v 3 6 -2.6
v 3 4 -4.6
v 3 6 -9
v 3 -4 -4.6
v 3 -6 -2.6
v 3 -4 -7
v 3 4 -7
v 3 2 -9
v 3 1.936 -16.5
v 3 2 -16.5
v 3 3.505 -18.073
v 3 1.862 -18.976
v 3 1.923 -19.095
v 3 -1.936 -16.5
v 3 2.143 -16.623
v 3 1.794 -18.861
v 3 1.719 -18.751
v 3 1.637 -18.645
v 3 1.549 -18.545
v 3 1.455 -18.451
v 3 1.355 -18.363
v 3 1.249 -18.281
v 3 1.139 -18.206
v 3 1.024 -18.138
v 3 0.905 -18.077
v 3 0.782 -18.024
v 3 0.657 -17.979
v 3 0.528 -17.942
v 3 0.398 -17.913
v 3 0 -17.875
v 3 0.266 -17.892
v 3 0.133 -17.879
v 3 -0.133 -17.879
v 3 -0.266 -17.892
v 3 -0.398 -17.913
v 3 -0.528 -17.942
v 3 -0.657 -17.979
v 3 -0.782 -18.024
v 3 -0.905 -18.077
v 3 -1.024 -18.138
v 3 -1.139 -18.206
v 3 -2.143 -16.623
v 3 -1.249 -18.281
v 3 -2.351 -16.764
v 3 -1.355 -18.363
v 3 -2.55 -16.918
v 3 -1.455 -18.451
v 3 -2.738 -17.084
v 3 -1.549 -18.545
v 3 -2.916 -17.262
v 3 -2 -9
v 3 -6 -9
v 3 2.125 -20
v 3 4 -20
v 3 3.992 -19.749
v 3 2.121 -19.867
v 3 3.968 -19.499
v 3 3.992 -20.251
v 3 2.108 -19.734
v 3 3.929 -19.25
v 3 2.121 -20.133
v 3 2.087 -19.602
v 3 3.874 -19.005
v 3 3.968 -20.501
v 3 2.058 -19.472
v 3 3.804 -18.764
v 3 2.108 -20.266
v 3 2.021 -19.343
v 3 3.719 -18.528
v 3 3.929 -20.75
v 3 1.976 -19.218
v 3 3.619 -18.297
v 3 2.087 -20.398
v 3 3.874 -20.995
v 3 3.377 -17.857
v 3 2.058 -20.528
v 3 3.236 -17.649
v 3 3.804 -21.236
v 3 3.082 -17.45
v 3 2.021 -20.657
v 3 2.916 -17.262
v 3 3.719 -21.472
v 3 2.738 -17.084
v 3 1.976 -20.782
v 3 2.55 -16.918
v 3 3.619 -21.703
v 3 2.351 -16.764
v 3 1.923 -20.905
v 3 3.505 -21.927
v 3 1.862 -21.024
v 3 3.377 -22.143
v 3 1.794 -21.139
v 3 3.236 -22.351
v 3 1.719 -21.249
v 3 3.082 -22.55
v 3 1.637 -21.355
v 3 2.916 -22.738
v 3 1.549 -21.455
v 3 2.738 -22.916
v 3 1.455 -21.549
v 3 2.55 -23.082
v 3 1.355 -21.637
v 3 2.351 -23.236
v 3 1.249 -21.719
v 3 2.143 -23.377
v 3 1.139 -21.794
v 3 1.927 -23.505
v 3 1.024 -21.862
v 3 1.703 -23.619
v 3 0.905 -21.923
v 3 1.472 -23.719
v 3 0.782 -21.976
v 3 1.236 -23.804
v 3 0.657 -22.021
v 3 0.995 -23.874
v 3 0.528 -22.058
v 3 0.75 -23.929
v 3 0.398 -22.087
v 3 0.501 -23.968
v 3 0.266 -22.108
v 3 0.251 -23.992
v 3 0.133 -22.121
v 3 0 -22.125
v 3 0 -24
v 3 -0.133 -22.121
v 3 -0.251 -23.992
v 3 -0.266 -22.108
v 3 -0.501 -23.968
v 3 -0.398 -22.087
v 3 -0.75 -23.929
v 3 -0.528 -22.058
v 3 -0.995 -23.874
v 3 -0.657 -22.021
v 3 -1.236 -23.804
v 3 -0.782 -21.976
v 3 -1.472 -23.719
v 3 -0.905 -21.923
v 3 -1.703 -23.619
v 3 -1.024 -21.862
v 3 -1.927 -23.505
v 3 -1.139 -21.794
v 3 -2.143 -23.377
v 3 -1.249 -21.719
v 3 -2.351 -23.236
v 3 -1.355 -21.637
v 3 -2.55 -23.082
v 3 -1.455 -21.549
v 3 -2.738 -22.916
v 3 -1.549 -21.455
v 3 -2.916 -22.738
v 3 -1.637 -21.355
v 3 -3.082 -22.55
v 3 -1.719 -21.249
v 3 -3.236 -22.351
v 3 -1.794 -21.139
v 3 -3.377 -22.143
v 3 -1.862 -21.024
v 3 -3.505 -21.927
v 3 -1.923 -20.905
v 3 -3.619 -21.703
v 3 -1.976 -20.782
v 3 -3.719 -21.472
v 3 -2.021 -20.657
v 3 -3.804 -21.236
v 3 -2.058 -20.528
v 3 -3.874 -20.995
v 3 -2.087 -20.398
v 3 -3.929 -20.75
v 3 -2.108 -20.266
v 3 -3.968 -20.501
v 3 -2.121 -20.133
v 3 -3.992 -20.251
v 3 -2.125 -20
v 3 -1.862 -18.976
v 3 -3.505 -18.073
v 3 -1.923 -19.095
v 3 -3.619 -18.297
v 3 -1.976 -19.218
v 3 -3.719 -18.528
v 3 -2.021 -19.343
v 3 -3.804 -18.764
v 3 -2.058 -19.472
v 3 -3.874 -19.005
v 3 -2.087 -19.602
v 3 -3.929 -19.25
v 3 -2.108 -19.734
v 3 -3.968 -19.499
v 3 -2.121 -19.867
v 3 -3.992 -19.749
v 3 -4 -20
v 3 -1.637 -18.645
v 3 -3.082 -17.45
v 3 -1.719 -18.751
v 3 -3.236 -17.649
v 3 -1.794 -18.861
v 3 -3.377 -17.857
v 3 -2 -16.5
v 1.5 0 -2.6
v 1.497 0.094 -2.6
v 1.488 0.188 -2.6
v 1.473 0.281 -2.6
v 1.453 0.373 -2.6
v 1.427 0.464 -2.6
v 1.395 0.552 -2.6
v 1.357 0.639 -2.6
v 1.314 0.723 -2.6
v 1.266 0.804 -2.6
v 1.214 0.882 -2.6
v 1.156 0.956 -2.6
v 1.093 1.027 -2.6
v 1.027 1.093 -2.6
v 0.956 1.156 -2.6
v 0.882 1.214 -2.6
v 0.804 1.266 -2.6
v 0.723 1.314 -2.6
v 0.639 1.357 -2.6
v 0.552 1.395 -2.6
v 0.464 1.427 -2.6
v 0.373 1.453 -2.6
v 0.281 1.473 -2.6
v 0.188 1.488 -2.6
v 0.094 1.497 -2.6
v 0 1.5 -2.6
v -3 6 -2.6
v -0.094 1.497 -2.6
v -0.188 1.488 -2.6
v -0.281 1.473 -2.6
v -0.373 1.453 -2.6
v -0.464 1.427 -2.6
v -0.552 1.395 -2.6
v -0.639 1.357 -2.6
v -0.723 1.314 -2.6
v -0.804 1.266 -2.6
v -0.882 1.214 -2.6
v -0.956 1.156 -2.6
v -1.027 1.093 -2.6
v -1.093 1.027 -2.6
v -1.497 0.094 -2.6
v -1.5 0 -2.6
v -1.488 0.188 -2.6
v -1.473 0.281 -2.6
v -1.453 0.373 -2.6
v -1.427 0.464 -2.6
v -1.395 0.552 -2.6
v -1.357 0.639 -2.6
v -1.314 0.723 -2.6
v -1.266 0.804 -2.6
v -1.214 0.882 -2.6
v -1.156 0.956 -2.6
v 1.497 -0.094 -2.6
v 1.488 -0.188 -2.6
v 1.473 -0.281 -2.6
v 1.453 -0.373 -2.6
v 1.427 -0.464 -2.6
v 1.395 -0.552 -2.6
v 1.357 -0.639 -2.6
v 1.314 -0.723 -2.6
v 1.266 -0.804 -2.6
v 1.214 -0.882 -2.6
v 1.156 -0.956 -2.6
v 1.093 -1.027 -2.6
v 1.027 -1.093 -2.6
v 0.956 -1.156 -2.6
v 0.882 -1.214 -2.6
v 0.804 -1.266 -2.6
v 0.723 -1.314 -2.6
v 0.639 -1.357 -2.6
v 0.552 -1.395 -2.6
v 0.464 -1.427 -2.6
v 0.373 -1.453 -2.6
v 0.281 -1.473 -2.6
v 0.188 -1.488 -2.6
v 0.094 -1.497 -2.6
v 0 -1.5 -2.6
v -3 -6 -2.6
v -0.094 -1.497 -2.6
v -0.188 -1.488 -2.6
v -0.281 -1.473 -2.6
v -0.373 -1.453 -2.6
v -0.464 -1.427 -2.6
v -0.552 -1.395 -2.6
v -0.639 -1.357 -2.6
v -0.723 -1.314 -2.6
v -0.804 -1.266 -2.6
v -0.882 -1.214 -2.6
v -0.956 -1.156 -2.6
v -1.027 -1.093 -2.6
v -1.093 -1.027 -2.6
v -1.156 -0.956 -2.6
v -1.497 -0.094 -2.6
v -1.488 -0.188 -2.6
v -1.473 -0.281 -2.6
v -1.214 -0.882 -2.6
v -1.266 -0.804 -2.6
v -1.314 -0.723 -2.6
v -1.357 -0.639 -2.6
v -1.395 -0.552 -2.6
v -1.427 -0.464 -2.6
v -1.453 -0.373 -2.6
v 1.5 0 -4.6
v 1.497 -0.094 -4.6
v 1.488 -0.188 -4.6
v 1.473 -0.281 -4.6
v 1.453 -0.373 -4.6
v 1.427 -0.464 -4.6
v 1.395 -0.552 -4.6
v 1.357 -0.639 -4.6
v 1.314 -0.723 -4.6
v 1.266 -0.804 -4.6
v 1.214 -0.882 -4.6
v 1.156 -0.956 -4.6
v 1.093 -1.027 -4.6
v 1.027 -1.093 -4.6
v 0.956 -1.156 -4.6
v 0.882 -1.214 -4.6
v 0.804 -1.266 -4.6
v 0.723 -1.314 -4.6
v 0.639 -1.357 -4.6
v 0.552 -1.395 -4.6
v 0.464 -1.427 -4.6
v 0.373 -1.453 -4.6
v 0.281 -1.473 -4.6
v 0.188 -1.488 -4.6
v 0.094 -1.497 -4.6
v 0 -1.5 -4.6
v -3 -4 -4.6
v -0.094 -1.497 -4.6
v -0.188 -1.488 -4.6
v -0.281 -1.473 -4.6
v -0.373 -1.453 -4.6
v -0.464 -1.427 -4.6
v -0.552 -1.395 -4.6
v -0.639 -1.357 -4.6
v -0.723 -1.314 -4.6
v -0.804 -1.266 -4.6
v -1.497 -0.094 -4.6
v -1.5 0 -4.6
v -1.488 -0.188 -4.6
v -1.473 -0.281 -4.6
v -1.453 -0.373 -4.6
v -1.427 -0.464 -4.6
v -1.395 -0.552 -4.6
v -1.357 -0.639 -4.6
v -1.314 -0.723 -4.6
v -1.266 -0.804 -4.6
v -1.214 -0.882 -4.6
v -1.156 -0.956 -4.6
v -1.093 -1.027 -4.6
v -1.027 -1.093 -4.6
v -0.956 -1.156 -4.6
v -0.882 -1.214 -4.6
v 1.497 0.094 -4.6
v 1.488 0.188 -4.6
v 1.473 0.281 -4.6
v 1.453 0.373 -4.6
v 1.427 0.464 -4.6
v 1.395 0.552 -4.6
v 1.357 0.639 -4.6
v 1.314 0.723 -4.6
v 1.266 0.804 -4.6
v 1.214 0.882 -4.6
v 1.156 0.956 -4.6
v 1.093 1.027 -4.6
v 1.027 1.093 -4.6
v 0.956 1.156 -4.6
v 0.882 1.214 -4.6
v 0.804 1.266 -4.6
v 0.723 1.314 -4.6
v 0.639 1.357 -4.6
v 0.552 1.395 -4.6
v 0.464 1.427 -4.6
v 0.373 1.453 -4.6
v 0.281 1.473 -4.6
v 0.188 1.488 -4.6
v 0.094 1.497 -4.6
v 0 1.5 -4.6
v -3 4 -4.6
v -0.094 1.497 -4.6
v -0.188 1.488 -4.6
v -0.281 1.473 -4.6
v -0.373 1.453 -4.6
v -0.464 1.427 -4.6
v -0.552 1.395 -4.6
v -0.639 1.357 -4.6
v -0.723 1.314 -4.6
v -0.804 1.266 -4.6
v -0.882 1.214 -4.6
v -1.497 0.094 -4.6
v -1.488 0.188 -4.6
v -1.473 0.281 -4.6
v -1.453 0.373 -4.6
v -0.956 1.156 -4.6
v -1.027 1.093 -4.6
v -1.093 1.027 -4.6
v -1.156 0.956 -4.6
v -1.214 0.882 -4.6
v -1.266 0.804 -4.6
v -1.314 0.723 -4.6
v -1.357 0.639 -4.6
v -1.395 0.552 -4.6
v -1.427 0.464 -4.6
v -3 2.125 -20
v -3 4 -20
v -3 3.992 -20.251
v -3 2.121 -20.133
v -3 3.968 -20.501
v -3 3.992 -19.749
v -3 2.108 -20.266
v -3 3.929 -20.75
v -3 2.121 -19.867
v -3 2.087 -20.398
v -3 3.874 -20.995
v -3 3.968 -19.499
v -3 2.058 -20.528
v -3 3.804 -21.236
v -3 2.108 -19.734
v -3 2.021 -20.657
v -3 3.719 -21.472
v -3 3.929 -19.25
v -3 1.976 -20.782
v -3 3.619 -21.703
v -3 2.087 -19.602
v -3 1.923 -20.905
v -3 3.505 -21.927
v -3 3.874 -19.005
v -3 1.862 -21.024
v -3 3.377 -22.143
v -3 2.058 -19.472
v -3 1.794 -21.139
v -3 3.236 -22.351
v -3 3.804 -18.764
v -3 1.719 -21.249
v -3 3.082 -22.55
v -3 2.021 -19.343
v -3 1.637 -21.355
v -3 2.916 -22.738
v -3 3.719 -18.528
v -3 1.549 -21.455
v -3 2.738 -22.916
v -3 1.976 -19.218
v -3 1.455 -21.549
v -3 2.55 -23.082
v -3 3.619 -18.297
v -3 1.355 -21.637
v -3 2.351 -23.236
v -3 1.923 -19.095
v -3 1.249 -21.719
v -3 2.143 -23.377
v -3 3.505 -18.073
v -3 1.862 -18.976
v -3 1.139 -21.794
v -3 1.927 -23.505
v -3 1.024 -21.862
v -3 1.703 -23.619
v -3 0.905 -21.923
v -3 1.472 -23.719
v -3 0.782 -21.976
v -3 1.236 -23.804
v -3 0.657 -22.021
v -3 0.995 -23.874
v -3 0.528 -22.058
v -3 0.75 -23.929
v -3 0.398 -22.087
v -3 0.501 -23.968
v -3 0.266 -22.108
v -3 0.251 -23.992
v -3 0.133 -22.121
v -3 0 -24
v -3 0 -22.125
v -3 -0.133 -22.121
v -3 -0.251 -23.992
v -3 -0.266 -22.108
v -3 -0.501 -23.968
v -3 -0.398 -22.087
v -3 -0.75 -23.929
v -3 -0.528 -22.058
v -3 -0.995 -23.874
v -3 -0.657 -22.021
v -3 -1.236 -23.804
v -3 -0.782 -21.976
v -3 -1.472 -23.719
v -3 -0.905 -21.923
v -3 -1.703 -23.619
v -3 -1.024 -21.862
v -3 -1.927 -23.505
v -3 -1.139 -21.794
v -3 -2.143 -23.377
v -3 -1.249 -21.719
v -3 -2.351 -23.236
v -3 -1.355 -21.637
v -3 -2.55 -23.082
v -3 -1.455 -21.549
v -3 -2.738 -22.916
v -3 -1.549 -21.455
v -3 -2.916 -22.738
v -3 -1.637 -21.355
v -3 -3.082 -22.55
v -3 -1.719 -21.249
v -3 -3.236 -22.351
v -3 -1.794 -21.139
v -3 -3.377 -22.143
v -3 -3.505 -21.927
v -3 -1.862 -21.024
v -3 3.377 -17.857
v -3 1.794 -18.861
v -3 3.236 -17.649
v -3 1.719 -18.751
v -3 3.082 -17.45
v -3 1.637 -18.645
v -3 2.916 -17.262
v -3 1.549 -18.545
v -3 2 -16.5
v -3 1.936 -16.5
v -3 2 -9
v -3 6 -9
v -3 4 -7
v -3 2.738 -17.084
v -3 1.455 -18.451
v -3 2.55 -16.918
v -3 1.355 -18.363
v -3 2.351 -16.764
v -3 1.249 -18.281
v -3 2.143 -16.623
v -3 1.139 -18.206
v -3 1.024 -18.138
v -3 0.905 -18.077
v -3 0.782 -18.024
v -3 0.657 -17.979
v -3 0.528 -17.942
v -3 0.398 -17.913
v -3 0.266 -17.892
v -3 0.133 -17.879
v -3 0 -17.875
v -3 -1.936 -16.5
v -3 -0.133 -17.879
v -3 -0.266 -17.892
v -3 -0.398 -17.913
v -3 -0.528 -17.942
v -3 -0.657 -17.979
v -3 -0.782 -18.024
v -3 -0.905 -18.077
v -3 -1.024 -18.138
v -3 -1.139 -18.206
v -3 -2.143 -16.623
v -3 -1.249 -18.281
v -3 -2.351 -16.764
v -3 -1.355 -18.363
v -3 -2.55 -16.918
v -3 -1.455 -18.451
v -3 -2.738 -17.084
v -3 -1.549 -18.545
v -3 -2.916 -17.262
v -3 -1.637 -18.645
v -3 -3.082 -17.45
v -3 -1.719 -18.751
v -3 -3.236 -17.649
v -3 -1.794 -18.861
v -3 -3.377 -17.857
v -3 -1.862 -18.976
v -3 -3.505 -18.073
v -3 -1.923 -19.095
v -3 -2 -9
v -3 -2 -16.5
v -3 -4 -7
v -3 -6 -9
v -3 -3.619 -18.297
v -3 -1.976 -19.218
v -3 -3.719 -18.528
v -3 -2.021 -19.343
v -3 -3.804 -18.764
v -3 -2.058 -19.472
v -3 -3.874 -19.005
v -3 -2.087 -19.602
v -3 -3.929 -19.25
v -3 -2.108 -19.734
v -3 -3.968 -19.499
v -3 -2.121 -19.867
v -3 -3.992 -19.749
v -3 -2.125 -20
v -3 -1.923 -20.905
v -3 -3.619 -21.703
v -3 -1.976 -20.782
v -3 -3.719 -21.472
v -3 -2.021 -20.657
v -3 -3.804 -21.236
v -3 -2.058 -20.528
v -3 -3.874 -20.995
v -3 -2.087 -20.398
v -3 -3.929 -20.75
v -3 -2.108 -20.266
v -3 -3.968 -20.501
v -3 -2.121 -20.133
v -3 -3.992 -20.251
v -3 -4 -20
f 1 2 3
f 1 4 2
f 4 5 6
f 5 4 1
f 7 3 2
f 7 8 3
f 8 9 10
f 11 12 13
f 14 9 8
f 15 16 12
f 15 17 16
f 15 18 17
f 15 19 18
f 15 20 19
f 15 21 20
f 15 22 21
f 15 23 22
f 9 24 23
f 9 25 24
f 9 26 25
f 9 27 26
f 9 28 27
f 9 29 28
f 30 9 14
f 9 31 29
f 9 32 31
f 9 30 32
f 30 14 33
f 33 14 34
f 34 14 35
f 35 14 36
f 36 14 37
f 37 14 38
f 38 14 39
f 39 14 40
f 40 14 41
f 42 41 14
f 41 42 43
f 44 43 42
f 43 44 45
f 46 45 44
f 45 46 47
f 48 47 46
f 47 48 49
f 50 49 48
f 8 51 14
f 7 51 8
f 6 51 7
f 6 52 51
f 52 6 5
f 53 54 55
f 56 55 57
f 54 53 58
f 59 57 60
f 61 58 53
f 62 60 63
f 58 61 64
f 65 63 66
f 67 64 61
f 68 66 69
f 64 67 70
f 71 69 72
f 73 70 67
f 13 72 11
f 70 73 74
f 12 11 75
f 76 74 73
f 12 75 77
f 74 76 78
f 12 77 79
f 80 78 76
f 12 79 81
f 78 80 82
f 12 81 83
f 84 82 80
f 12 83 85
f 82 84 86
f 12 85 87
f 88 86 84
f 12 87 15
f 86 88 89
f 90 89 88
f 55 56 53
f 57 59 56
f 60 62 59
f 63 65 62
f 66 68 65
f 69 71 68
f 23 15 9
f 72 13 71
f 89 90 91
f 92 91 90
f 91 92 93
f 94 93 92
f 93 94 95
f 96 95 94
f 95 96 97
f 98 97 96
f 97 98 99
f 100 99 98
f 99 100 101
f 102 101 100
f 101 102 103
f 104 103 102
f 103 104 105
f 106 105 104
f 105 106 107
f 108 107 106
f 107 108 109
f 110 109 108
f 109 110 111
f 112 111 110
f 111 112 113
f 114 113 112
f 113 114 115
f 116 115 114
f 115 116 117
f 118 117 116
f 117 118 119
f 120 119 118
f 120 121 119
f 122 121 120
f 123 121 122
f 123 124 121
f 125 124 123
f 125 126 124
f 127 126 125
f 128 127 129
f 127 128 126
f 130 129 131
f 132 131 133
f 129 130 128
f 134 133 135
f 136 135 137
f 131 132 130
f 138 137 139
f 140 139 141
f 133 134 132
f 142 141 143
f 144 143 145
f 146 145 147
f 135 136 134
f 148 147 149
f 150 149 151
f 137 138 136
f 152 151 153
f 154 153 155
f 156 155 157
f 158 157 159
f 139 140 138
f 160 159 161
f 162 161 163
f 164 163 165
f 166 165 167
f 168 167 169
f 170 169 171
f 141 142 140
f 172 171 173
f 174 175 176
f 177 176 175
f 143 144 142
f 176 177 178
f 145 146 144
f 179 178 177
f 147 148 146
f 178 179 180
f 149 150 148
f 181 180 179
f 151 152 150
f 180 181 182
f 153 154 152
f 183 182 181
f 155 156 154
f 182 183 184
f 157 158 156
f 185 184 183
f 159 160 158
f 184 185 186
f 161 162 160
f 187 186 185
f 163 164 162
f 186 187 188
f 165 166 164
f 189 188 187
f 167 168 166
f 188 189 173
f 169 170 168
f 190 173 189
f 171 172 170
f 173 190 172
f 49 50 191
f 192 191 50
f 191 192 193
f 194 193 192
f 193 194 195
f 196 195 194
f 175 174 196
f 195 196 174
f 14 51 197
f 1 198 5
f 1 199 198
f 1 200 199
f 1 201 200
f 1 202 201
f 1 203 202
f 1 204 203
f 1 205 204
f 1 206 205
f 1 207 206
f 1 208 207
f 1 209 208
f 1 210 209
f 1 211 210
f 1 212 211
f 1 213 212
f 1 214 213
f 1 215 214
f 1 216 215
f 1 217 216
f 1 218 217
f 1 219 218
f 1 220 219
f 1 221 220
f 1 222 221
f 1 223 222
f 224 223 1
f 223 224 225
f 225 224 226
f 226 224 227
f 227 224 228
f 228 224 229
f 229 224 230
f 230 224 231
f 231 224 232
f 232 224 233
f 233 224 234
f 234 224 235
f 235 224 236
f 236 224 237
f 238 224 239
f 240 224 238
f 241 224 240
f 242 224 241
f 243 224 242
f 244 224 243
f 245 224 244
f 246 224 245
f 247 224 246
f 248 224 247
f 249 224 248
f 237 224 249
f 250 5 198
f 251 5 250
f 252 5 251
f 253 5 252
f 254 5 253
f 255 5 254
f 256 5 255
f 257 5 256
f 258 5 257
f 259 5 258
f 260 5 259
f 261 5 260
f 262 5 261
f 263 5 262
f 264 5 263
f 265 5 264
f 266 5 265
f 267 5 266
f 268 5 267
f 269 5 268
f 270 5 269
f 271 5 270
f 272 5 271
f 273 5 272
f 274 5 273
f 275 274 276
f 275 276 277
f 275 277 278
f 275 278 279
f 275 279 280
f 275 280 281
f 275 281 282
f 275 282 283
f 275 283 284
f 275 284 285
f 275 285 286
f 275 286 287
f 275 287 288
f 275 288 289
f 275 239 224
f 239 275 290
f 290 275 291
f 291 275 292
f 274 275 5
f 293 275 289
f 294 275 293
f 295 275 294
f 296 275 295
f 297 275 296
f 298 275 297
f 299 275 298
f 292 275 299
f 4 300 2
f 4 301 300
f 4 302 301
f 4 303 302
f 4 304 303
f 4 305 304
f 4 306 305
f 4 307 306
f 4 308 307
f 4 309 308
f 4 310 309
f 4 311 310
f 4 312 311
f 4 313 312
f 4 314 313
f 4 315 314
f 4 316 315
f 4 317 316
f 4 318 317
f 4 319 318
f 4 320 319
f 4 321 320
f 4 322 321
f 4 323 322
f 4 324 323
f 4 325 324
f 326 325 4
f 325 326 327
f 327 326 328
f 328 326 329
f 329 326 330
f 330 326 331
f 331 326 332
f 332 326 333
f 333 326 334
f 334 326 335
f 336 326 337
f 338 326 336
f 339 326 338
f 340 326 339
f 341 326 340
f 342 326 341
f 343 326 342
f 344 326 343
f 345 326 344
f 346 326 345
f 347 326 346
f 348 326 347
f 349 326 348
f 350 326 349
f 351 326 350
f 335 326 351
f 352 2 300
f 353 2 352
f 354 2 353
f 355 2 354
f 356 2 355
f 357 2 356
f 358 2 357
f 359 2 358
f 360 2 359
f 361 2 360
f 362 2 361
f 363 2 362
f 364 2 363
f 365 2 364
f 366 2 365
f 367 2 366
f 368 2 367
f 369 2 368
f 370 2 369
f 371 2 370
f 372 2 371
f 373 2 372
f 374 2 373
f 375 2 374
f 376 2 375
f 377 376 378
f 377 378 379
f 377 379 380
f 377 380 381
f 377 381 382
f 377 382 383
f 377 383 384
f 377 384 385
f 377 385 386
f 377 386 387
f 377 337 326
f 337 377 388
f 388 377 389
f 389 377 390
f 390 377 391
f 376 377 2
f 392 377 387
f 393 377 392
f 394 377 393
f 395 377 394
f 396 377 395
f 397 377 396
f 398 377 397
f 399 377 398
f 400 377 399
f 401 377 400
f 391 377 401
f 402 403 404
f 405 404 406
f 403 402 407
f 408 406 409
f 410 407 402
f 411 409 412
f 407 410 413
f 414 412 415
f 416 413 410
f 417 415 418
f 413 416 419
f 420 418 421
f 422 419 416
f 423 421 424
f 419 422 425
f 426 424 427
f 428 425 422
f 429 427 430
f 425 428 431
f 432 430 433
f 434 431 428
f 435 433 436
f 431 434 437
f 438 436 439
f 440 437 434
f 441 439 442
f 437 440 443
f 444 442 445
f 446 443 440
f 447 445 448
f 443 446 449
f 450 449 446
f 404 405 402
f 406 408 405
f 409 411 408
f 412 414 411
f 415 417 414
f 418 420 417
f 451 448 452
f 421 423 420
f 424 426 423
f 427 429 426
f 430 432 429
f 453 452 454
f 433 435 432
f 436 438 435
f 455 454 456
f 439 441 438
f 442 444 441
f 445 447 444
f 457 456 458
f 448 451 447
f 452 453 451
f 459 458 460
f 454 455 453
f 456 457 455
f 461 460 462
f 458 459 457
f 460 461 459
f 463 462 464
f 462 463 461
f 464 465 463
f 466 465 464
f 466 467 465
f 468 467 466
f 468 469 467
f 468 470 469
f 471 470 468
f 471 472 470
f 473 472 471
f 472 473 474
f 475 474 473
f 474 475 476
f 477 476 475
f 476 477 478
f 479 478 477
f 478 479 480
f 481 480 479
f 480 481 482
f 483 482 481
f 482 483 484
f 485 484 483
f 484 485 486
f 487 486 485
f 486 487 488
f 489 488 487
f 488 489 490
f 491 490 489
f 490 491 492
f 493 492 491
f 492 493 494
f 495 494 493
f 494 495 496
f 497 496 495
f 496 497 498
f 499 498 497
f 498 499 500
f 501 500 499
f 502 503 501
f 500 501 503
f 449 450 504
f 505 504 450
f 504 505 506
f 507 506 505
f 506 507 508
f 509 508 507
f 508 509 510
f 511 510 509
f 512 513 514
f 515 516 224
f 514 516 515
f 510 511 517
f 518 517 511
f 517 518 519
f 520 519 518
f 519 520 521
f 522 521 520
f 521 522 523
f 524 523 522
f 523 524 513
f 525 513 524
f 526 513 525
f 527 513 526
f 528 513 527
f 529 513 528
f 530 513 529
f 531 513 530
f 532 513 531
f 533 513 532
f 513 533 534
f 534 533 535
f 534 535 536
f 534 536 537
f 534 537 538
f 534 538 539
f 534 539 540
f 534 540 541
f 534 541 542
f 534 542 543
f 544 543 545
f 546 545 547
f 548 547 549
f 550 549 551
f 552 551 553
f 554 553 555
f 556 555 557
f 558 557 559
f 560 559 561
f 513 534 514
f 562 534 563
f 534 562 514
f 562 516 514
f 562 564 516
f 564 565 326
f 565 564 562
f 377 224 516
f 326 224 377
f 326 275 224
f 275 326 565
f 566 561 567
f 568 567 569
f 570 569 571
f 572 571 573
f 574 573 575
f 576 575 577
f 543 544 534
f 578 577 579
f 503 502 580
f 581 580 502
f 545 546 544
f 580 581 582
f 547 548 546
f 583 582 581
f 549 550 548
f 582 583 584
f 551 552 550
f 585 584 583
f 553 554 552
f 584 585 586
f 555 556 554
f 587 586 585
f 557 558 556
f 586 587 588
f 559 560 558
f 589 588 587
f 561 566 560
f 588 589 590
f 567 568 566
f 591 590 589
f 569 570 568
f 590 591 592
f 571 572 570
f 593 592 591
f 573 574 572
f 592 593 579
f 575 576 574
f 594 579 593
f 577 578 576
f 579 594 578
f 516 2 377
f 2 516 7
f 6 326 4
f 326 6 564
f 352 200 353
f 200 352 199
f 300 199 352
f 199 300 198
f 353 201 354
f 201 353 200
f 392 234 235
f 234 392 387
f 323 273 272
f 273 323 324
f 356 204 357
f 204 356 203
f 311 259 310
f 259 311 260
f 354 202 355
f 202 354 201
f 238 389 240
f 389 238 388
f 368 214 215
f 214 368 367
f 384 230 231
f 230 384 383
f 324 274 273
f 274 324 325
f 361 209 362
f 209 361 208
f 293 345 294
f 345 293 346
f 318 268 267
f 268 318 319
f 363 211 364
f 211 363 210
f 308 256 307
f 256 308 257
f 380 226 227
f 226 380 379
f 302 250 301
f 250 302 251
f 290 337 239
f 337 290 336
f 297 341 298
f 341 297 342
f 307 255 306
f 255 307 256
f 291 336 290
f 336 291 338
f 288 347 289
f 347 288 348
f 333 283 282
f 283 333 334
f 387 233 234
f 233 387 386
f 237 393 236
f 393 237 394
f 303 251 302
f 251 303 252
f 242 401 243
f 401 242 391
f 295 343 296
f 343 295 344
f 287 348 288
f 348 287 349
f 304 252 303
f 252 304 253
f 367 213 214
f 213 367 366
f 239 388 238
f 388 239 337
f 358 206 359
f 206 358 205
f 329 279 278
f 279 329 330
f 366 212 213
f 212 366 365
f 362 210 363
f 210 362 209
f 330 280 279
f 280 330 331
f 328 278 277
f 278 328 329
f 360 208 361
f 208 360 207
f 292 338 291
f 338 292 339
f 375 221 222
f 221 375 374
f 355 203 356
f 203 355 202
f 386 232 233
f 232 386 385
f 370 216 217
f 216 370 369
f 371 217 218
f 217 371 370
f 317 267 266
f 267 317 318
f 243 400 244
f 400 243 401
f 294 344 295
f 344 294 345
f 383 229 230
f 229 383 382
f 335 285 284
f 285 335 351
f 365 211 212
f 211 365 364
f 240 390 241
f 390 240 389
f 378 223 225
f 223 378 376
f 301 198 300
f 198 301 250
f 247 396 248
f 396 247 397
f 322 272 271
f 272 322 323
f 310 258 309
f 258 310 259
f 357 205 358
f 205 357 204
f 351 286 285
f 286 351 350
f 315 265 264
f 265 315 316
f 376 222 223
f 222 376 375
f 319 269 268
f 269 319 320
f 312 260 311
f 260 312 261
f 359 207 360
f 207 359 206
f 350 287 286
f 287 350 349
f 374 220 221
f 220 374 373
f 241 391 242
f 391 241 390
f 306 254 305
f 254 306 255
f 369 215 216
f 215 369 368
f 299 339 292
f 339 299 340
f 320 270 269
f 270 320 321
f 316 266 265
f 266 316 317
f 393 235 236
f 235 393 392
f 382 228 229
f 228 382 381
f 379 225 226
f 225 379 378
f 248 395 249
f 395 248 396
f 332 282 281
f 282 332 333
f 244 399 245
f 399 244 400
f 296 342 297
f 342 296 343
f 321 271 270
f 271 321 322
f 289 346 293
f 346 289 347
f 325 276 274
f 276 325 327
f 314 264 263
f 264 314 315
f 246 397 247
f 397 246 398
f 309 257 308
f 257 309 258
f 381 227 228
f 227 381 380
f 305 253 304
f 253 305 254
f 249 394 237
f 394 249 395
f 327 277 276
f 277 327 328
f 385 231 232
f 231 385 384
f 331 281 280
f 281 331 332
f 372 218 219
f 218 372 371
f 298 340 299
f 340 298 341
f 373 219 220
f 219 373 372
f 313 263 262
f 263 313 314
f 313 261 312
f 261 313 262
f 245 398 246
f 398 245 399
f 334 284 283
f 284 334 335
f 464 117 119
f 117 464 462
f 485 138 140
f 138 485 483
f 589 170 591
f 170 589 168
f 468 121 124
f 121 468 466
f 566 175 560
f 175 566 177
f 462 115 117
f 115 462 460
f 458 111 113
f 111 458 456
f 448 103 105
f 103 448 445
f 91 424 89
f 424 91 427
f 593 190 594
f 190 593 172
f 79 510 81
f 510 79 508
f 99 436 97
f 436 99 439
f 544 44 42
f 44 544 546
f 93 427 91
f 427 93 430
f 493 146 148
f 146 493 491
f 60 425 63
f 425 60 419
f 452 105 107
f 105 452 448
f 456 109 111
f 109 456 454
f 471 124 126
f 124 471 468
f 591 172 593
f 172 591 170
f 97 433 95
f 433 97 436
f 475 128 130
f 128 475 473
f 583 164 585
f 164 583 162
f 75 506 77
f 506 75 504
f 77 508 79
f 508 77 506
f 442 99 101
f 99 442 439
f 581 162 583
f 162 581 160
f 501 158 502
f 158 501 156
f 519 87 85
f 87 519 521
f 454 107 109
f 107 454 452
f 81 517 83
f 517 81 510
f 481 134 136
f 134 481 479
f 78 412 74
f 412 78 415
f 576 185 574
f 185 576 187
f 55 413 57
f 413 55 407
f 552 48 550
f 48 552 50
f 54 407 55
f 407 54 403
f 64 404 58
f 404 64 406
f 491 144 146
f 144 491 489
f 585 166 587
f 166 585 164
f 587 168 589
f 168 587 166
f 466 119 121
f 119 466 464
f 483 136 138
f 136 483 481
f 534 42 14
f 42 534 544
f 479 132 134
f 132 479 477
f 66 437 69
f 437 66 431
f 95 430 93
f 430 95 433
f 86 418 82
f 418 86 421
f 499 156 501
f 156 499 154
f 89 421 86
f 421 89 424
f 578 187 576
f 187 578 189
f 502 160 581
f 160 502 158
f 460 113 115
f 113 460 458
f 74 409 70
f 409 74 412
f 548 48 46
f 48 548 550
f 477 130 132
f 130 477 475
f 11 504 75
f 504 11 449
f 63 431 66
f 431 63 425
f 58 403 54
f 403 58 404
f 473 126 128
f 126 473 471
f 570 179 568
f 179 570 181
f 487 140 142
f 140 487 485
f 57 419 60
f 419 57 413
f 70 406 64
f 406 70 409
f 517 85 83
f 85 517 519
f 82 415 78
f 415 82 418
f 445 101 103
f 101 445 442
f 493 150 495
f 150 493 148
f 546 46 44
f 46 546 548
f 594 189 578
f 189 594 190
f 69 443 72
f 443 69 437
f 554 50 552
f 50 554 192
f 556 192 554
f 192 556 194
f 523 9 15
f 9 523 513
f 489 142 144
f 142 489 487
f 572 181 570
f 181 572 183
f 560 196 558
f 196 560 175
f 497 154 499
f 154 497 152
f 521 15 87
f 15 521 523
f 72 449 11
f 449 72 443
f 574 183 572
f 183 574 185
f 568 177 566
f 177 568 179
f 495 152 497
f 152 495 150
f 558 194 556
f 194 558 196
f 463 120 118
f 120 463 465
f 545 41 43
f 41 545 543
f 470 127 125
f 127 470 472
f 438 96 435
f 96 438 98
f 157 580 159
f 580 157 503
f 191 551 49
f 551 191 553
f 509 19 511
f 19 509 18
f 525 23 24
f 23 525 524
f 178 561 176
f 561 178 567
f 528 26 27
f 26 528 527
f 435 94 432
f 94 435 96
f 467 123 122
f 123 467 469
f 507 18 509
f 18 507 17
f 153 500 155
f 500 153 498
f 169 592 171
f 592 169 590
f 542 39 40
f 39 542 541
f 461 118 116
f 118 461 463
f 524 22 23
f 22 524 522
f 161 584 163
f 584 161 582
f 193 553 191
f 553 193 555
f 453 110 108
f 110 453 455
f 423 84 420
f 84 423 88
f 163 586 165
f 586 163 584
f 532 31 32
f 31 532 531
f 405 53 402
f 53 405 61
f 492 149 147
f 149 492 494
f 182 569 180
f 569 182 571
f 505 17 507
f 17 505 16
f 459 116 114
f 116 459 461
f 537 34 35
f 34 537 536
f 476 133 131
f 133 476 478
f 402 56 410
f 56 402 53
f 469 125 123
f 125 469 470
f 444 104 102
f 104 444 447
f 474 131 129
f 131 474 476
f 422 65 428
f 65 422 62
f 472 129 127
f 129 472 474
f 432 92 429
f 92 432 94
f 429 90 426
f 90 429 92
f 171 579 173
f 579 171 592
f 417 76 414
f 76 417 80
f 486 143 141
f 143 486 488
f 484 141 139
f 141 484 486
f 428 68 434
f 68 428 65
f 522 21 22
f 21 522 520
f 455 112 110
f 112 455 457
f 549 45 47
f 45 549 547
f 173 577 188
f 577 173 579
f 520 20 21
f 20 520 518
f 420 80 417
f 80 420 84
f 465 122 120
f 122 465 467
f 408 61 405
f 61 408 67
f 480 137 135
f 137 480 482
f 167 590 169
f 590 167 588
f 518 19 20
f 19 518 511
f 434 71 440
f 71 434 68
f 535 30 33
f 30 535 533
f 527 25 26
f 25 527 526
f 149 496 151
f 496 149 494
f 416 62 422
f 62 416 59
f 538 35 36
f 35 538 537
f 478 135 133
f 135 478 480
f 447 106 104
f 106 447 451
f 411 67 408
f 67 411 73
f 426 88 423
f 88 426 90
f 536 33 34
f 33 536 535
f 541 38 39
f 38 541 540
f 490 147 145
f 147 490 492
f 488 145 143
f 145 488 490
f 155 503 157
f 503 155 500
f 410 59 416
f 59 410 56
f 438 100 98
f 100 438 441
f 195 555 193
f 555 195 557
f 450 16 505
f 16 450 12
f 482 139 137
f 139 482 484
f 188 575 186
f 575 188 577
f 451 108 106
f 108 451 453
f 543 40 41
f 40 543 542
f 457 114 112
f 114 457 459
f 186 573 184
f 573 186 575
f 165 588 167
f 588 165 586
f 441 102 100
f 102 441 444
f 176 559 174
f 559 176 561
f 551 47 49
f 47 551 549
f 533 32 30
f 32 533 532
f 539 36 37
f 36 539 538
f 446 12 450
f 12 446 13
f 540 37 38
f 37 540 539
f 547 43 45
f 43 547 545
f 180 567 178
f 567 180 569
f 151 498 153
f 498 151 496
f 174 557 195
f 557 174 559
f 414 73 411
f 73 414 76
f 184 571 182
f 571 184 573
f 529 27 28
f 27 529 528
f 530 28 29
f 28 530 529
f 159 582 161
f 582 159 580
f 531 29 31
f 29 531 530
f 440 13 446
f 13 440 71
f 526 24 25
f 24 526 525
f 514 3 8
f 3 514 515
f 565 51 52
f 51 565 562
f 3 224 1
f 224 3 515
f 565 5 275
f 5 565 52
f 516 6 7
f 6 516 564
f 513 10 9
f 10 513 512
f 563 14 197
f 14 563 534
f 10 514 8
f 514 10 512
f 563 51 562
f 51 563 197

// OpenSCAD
$fn=100;
//Bearing();
//Magnet();
translate([0,0,-20]) Mholder();
//Top();
//Base();



module Base(){
    height=10; // change height
    difference(){
        translate([0,0,-height+3]) cylinder(h=height, d=30);
        translate([0,0,-.5]) cylinder(h=5, d=8.5);
        translate([0,0,-height+0]) cylinder(h=height, d=26);
}
}

module Magnet(){
    #translate([0,0,-20]) rotate([0,90,0])cylinder(h=10, d=4, center=true);
}

module Mholder(){
    difference(){
        translate([0,0,16.4]) cube ([6,8,2],center=true);//top nut hole
        translate([0,0,13]) cylinder(h=8, d=3);//centre hole
    }
    translate([-3,4,11]) cube ([6,2,6.4]);//side nut hole
    translate([-3.0,-6,11.0]) cube ([6,2,6.4]);//- side nut hole
    //translate([0,0,14.2]) cube ([6.5,6.5,2.2],center=true);//fake nut
    
    translate([0,0,12]) cube ([6,8,2.0],center=true);//bottom nut hole
    translate([0,0,8]) cube ([6,4,9], center=true);//shaft
    difference(){
        rotate([0,90,0]) cylinder(h=6, d=8, center=true);
        translate([0,0,0]) rotate([0,90,0])cylinder(h=10, d=4.25, center=true);
    }
}

module Top(){

    union (){
        translate([0,3,6]) cube ([4,68,4]);//shaft
        translate([+0,70,6.8]) rotate([0,25,0]) cube ([2,15,10]);//grip
    }
    rotate([0,0, 120]) union (){
        translate([0,3,6]) cube ([4,68,4]);//shaft
        translate([+0,70.6,6.8]) rotate([0,25,0]) cube ([2,15,10]);//grip
    }
    rotate([0,0, 240]) union (){
        translate([0,3,6]) cube ([4,68,4]);//shaft
        translate([+0,70.6,6.8]) rotate([0,25,0]) cube ([2,15,10]);//grip
    }
  difference(){
    translate([0,0,6]) cylinder(h=4, r=15);
    translate([0,0,3]) cylinder(h=8, d=3);//centre hole
}  
}


module Bearing(){

    difference(){
        union(){
            translate([0,0,3]) cylinder(h=1, d=9.5);
            cylinder(h=3, d=8);
        }
        translate([0,0,-.5])cylinder(h=6, d=3);
    }
}
